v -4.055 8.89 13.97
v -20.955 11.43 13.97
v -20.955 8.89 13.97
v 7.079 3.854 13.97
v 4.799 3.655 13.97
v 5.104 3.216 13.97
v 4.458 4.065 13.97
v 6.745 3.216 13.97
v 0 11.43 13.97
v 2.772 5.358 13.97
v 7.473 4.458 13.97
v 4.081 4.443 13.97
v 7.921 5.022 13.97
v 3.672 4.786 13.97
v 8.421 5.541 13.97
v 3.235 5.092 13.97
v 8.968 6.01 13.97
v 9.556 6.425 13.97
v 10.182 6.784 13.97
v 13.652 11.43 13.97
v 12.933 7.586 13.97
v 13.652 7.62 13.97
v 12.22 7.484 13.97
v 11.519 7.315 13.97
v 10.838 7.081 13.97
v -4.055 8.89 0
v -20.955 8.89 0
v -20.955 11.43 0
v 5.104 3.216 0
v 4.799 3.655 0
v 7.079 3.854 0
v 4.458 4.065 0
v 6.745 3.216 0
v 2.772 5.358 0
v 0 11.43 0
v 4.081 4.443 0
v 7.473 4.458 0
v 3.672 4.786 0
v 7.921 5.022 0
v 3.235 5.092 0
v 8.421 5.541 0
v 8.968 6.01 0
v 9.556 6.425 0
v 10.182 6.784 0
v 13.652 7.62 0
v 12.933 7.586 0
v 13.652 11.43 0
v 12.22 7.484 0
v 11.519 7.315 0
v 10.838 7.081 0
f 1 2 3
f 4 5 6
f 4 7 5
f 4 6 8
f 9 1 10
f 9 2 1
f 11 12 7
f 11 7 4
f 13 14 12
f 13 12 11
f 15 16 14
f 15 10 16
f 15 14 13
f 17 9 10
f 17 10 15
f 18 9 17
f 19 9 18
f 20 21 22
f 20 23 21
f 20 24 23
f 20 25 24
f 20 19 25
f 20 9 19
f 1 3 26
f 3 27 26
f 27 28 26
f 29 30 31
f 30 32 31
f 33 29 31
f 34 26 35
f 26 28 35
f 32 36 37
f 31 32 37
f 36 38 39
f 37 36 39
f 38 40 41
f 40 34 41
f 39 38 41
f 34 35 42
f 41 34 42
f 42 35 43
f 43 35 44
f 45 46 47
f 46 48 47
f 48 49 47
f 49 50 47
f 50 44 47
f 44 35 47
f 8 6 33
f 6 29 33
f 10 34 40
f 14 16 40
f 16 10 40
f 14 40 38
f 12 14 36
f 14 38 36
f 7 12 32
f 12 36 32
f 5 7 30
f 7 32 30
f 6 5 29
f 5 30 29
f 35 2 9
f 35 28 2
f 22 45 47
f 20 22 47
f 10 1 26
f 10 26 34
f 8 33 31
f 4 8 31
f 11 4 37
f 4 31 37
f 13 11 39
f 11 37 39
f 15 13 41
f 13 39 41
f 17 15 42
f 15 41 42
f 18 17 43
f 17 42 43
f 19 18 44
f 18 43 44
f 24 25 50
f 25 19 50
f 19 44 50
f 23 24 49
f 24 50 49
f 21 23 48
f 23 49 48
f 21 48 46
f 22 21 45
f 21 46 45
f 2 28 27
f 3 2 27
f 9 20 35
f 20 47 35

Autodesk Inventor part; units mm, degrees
ref_plane "YZ Plane" through (0, 0, 0) normal (1, 0, 0) x (0, 1, 0)
ref_plane "XZ Plane" through (0, 0, 0) normal (0, 1, 0) x (-1, 0, 0)
ref_plane "XY Plane" through (0, 0, 0) normal (0, 0, 1) x (1, 0, 0)
sketch "Sketch1" plane through (0, 0, 0) normal (0, 0, 1) x (1, 0, 0)
  arc A0 (5.1036, 3.2163) -> (2.772, 5.3579) centre (0, 0) ccw
  arc A1 (13.6525, 7.62) -> (6.7446, 3.2163) centre (13.6525, 0) ccw
  line L0 (13.6525, 11.43) -> (0, 11.43)
  line L1 (-20.955, 11.43) -> (0, 11.43)
  line L2 (5.1036, 3.2163) -> (6.7446, 3.2163)
  line L3 (-20.955, 11.43) -> (-20.955, 8.89)
  line L4 (-20.955, 8.89) -> (-4.055, 8.89)
  line L5 (-4.055, 8.89) -> (2.772, 5.3579)
  line L6 (13.6525, 7.62) -> (13.6525, 11.43)
  dimension "d0" = 12.065
  dimension "d4" = 2.54
extrude "Extrusion1" add sketch "Sketch1" along normal blind 13.97
sketch "Sketch2" plane through (5.1036, 3.2163, 0) normal (0, -1, 0) x (1, 0, 0)
  point P0 (-5.1036, 0)
properties part number "Antibuckler"
